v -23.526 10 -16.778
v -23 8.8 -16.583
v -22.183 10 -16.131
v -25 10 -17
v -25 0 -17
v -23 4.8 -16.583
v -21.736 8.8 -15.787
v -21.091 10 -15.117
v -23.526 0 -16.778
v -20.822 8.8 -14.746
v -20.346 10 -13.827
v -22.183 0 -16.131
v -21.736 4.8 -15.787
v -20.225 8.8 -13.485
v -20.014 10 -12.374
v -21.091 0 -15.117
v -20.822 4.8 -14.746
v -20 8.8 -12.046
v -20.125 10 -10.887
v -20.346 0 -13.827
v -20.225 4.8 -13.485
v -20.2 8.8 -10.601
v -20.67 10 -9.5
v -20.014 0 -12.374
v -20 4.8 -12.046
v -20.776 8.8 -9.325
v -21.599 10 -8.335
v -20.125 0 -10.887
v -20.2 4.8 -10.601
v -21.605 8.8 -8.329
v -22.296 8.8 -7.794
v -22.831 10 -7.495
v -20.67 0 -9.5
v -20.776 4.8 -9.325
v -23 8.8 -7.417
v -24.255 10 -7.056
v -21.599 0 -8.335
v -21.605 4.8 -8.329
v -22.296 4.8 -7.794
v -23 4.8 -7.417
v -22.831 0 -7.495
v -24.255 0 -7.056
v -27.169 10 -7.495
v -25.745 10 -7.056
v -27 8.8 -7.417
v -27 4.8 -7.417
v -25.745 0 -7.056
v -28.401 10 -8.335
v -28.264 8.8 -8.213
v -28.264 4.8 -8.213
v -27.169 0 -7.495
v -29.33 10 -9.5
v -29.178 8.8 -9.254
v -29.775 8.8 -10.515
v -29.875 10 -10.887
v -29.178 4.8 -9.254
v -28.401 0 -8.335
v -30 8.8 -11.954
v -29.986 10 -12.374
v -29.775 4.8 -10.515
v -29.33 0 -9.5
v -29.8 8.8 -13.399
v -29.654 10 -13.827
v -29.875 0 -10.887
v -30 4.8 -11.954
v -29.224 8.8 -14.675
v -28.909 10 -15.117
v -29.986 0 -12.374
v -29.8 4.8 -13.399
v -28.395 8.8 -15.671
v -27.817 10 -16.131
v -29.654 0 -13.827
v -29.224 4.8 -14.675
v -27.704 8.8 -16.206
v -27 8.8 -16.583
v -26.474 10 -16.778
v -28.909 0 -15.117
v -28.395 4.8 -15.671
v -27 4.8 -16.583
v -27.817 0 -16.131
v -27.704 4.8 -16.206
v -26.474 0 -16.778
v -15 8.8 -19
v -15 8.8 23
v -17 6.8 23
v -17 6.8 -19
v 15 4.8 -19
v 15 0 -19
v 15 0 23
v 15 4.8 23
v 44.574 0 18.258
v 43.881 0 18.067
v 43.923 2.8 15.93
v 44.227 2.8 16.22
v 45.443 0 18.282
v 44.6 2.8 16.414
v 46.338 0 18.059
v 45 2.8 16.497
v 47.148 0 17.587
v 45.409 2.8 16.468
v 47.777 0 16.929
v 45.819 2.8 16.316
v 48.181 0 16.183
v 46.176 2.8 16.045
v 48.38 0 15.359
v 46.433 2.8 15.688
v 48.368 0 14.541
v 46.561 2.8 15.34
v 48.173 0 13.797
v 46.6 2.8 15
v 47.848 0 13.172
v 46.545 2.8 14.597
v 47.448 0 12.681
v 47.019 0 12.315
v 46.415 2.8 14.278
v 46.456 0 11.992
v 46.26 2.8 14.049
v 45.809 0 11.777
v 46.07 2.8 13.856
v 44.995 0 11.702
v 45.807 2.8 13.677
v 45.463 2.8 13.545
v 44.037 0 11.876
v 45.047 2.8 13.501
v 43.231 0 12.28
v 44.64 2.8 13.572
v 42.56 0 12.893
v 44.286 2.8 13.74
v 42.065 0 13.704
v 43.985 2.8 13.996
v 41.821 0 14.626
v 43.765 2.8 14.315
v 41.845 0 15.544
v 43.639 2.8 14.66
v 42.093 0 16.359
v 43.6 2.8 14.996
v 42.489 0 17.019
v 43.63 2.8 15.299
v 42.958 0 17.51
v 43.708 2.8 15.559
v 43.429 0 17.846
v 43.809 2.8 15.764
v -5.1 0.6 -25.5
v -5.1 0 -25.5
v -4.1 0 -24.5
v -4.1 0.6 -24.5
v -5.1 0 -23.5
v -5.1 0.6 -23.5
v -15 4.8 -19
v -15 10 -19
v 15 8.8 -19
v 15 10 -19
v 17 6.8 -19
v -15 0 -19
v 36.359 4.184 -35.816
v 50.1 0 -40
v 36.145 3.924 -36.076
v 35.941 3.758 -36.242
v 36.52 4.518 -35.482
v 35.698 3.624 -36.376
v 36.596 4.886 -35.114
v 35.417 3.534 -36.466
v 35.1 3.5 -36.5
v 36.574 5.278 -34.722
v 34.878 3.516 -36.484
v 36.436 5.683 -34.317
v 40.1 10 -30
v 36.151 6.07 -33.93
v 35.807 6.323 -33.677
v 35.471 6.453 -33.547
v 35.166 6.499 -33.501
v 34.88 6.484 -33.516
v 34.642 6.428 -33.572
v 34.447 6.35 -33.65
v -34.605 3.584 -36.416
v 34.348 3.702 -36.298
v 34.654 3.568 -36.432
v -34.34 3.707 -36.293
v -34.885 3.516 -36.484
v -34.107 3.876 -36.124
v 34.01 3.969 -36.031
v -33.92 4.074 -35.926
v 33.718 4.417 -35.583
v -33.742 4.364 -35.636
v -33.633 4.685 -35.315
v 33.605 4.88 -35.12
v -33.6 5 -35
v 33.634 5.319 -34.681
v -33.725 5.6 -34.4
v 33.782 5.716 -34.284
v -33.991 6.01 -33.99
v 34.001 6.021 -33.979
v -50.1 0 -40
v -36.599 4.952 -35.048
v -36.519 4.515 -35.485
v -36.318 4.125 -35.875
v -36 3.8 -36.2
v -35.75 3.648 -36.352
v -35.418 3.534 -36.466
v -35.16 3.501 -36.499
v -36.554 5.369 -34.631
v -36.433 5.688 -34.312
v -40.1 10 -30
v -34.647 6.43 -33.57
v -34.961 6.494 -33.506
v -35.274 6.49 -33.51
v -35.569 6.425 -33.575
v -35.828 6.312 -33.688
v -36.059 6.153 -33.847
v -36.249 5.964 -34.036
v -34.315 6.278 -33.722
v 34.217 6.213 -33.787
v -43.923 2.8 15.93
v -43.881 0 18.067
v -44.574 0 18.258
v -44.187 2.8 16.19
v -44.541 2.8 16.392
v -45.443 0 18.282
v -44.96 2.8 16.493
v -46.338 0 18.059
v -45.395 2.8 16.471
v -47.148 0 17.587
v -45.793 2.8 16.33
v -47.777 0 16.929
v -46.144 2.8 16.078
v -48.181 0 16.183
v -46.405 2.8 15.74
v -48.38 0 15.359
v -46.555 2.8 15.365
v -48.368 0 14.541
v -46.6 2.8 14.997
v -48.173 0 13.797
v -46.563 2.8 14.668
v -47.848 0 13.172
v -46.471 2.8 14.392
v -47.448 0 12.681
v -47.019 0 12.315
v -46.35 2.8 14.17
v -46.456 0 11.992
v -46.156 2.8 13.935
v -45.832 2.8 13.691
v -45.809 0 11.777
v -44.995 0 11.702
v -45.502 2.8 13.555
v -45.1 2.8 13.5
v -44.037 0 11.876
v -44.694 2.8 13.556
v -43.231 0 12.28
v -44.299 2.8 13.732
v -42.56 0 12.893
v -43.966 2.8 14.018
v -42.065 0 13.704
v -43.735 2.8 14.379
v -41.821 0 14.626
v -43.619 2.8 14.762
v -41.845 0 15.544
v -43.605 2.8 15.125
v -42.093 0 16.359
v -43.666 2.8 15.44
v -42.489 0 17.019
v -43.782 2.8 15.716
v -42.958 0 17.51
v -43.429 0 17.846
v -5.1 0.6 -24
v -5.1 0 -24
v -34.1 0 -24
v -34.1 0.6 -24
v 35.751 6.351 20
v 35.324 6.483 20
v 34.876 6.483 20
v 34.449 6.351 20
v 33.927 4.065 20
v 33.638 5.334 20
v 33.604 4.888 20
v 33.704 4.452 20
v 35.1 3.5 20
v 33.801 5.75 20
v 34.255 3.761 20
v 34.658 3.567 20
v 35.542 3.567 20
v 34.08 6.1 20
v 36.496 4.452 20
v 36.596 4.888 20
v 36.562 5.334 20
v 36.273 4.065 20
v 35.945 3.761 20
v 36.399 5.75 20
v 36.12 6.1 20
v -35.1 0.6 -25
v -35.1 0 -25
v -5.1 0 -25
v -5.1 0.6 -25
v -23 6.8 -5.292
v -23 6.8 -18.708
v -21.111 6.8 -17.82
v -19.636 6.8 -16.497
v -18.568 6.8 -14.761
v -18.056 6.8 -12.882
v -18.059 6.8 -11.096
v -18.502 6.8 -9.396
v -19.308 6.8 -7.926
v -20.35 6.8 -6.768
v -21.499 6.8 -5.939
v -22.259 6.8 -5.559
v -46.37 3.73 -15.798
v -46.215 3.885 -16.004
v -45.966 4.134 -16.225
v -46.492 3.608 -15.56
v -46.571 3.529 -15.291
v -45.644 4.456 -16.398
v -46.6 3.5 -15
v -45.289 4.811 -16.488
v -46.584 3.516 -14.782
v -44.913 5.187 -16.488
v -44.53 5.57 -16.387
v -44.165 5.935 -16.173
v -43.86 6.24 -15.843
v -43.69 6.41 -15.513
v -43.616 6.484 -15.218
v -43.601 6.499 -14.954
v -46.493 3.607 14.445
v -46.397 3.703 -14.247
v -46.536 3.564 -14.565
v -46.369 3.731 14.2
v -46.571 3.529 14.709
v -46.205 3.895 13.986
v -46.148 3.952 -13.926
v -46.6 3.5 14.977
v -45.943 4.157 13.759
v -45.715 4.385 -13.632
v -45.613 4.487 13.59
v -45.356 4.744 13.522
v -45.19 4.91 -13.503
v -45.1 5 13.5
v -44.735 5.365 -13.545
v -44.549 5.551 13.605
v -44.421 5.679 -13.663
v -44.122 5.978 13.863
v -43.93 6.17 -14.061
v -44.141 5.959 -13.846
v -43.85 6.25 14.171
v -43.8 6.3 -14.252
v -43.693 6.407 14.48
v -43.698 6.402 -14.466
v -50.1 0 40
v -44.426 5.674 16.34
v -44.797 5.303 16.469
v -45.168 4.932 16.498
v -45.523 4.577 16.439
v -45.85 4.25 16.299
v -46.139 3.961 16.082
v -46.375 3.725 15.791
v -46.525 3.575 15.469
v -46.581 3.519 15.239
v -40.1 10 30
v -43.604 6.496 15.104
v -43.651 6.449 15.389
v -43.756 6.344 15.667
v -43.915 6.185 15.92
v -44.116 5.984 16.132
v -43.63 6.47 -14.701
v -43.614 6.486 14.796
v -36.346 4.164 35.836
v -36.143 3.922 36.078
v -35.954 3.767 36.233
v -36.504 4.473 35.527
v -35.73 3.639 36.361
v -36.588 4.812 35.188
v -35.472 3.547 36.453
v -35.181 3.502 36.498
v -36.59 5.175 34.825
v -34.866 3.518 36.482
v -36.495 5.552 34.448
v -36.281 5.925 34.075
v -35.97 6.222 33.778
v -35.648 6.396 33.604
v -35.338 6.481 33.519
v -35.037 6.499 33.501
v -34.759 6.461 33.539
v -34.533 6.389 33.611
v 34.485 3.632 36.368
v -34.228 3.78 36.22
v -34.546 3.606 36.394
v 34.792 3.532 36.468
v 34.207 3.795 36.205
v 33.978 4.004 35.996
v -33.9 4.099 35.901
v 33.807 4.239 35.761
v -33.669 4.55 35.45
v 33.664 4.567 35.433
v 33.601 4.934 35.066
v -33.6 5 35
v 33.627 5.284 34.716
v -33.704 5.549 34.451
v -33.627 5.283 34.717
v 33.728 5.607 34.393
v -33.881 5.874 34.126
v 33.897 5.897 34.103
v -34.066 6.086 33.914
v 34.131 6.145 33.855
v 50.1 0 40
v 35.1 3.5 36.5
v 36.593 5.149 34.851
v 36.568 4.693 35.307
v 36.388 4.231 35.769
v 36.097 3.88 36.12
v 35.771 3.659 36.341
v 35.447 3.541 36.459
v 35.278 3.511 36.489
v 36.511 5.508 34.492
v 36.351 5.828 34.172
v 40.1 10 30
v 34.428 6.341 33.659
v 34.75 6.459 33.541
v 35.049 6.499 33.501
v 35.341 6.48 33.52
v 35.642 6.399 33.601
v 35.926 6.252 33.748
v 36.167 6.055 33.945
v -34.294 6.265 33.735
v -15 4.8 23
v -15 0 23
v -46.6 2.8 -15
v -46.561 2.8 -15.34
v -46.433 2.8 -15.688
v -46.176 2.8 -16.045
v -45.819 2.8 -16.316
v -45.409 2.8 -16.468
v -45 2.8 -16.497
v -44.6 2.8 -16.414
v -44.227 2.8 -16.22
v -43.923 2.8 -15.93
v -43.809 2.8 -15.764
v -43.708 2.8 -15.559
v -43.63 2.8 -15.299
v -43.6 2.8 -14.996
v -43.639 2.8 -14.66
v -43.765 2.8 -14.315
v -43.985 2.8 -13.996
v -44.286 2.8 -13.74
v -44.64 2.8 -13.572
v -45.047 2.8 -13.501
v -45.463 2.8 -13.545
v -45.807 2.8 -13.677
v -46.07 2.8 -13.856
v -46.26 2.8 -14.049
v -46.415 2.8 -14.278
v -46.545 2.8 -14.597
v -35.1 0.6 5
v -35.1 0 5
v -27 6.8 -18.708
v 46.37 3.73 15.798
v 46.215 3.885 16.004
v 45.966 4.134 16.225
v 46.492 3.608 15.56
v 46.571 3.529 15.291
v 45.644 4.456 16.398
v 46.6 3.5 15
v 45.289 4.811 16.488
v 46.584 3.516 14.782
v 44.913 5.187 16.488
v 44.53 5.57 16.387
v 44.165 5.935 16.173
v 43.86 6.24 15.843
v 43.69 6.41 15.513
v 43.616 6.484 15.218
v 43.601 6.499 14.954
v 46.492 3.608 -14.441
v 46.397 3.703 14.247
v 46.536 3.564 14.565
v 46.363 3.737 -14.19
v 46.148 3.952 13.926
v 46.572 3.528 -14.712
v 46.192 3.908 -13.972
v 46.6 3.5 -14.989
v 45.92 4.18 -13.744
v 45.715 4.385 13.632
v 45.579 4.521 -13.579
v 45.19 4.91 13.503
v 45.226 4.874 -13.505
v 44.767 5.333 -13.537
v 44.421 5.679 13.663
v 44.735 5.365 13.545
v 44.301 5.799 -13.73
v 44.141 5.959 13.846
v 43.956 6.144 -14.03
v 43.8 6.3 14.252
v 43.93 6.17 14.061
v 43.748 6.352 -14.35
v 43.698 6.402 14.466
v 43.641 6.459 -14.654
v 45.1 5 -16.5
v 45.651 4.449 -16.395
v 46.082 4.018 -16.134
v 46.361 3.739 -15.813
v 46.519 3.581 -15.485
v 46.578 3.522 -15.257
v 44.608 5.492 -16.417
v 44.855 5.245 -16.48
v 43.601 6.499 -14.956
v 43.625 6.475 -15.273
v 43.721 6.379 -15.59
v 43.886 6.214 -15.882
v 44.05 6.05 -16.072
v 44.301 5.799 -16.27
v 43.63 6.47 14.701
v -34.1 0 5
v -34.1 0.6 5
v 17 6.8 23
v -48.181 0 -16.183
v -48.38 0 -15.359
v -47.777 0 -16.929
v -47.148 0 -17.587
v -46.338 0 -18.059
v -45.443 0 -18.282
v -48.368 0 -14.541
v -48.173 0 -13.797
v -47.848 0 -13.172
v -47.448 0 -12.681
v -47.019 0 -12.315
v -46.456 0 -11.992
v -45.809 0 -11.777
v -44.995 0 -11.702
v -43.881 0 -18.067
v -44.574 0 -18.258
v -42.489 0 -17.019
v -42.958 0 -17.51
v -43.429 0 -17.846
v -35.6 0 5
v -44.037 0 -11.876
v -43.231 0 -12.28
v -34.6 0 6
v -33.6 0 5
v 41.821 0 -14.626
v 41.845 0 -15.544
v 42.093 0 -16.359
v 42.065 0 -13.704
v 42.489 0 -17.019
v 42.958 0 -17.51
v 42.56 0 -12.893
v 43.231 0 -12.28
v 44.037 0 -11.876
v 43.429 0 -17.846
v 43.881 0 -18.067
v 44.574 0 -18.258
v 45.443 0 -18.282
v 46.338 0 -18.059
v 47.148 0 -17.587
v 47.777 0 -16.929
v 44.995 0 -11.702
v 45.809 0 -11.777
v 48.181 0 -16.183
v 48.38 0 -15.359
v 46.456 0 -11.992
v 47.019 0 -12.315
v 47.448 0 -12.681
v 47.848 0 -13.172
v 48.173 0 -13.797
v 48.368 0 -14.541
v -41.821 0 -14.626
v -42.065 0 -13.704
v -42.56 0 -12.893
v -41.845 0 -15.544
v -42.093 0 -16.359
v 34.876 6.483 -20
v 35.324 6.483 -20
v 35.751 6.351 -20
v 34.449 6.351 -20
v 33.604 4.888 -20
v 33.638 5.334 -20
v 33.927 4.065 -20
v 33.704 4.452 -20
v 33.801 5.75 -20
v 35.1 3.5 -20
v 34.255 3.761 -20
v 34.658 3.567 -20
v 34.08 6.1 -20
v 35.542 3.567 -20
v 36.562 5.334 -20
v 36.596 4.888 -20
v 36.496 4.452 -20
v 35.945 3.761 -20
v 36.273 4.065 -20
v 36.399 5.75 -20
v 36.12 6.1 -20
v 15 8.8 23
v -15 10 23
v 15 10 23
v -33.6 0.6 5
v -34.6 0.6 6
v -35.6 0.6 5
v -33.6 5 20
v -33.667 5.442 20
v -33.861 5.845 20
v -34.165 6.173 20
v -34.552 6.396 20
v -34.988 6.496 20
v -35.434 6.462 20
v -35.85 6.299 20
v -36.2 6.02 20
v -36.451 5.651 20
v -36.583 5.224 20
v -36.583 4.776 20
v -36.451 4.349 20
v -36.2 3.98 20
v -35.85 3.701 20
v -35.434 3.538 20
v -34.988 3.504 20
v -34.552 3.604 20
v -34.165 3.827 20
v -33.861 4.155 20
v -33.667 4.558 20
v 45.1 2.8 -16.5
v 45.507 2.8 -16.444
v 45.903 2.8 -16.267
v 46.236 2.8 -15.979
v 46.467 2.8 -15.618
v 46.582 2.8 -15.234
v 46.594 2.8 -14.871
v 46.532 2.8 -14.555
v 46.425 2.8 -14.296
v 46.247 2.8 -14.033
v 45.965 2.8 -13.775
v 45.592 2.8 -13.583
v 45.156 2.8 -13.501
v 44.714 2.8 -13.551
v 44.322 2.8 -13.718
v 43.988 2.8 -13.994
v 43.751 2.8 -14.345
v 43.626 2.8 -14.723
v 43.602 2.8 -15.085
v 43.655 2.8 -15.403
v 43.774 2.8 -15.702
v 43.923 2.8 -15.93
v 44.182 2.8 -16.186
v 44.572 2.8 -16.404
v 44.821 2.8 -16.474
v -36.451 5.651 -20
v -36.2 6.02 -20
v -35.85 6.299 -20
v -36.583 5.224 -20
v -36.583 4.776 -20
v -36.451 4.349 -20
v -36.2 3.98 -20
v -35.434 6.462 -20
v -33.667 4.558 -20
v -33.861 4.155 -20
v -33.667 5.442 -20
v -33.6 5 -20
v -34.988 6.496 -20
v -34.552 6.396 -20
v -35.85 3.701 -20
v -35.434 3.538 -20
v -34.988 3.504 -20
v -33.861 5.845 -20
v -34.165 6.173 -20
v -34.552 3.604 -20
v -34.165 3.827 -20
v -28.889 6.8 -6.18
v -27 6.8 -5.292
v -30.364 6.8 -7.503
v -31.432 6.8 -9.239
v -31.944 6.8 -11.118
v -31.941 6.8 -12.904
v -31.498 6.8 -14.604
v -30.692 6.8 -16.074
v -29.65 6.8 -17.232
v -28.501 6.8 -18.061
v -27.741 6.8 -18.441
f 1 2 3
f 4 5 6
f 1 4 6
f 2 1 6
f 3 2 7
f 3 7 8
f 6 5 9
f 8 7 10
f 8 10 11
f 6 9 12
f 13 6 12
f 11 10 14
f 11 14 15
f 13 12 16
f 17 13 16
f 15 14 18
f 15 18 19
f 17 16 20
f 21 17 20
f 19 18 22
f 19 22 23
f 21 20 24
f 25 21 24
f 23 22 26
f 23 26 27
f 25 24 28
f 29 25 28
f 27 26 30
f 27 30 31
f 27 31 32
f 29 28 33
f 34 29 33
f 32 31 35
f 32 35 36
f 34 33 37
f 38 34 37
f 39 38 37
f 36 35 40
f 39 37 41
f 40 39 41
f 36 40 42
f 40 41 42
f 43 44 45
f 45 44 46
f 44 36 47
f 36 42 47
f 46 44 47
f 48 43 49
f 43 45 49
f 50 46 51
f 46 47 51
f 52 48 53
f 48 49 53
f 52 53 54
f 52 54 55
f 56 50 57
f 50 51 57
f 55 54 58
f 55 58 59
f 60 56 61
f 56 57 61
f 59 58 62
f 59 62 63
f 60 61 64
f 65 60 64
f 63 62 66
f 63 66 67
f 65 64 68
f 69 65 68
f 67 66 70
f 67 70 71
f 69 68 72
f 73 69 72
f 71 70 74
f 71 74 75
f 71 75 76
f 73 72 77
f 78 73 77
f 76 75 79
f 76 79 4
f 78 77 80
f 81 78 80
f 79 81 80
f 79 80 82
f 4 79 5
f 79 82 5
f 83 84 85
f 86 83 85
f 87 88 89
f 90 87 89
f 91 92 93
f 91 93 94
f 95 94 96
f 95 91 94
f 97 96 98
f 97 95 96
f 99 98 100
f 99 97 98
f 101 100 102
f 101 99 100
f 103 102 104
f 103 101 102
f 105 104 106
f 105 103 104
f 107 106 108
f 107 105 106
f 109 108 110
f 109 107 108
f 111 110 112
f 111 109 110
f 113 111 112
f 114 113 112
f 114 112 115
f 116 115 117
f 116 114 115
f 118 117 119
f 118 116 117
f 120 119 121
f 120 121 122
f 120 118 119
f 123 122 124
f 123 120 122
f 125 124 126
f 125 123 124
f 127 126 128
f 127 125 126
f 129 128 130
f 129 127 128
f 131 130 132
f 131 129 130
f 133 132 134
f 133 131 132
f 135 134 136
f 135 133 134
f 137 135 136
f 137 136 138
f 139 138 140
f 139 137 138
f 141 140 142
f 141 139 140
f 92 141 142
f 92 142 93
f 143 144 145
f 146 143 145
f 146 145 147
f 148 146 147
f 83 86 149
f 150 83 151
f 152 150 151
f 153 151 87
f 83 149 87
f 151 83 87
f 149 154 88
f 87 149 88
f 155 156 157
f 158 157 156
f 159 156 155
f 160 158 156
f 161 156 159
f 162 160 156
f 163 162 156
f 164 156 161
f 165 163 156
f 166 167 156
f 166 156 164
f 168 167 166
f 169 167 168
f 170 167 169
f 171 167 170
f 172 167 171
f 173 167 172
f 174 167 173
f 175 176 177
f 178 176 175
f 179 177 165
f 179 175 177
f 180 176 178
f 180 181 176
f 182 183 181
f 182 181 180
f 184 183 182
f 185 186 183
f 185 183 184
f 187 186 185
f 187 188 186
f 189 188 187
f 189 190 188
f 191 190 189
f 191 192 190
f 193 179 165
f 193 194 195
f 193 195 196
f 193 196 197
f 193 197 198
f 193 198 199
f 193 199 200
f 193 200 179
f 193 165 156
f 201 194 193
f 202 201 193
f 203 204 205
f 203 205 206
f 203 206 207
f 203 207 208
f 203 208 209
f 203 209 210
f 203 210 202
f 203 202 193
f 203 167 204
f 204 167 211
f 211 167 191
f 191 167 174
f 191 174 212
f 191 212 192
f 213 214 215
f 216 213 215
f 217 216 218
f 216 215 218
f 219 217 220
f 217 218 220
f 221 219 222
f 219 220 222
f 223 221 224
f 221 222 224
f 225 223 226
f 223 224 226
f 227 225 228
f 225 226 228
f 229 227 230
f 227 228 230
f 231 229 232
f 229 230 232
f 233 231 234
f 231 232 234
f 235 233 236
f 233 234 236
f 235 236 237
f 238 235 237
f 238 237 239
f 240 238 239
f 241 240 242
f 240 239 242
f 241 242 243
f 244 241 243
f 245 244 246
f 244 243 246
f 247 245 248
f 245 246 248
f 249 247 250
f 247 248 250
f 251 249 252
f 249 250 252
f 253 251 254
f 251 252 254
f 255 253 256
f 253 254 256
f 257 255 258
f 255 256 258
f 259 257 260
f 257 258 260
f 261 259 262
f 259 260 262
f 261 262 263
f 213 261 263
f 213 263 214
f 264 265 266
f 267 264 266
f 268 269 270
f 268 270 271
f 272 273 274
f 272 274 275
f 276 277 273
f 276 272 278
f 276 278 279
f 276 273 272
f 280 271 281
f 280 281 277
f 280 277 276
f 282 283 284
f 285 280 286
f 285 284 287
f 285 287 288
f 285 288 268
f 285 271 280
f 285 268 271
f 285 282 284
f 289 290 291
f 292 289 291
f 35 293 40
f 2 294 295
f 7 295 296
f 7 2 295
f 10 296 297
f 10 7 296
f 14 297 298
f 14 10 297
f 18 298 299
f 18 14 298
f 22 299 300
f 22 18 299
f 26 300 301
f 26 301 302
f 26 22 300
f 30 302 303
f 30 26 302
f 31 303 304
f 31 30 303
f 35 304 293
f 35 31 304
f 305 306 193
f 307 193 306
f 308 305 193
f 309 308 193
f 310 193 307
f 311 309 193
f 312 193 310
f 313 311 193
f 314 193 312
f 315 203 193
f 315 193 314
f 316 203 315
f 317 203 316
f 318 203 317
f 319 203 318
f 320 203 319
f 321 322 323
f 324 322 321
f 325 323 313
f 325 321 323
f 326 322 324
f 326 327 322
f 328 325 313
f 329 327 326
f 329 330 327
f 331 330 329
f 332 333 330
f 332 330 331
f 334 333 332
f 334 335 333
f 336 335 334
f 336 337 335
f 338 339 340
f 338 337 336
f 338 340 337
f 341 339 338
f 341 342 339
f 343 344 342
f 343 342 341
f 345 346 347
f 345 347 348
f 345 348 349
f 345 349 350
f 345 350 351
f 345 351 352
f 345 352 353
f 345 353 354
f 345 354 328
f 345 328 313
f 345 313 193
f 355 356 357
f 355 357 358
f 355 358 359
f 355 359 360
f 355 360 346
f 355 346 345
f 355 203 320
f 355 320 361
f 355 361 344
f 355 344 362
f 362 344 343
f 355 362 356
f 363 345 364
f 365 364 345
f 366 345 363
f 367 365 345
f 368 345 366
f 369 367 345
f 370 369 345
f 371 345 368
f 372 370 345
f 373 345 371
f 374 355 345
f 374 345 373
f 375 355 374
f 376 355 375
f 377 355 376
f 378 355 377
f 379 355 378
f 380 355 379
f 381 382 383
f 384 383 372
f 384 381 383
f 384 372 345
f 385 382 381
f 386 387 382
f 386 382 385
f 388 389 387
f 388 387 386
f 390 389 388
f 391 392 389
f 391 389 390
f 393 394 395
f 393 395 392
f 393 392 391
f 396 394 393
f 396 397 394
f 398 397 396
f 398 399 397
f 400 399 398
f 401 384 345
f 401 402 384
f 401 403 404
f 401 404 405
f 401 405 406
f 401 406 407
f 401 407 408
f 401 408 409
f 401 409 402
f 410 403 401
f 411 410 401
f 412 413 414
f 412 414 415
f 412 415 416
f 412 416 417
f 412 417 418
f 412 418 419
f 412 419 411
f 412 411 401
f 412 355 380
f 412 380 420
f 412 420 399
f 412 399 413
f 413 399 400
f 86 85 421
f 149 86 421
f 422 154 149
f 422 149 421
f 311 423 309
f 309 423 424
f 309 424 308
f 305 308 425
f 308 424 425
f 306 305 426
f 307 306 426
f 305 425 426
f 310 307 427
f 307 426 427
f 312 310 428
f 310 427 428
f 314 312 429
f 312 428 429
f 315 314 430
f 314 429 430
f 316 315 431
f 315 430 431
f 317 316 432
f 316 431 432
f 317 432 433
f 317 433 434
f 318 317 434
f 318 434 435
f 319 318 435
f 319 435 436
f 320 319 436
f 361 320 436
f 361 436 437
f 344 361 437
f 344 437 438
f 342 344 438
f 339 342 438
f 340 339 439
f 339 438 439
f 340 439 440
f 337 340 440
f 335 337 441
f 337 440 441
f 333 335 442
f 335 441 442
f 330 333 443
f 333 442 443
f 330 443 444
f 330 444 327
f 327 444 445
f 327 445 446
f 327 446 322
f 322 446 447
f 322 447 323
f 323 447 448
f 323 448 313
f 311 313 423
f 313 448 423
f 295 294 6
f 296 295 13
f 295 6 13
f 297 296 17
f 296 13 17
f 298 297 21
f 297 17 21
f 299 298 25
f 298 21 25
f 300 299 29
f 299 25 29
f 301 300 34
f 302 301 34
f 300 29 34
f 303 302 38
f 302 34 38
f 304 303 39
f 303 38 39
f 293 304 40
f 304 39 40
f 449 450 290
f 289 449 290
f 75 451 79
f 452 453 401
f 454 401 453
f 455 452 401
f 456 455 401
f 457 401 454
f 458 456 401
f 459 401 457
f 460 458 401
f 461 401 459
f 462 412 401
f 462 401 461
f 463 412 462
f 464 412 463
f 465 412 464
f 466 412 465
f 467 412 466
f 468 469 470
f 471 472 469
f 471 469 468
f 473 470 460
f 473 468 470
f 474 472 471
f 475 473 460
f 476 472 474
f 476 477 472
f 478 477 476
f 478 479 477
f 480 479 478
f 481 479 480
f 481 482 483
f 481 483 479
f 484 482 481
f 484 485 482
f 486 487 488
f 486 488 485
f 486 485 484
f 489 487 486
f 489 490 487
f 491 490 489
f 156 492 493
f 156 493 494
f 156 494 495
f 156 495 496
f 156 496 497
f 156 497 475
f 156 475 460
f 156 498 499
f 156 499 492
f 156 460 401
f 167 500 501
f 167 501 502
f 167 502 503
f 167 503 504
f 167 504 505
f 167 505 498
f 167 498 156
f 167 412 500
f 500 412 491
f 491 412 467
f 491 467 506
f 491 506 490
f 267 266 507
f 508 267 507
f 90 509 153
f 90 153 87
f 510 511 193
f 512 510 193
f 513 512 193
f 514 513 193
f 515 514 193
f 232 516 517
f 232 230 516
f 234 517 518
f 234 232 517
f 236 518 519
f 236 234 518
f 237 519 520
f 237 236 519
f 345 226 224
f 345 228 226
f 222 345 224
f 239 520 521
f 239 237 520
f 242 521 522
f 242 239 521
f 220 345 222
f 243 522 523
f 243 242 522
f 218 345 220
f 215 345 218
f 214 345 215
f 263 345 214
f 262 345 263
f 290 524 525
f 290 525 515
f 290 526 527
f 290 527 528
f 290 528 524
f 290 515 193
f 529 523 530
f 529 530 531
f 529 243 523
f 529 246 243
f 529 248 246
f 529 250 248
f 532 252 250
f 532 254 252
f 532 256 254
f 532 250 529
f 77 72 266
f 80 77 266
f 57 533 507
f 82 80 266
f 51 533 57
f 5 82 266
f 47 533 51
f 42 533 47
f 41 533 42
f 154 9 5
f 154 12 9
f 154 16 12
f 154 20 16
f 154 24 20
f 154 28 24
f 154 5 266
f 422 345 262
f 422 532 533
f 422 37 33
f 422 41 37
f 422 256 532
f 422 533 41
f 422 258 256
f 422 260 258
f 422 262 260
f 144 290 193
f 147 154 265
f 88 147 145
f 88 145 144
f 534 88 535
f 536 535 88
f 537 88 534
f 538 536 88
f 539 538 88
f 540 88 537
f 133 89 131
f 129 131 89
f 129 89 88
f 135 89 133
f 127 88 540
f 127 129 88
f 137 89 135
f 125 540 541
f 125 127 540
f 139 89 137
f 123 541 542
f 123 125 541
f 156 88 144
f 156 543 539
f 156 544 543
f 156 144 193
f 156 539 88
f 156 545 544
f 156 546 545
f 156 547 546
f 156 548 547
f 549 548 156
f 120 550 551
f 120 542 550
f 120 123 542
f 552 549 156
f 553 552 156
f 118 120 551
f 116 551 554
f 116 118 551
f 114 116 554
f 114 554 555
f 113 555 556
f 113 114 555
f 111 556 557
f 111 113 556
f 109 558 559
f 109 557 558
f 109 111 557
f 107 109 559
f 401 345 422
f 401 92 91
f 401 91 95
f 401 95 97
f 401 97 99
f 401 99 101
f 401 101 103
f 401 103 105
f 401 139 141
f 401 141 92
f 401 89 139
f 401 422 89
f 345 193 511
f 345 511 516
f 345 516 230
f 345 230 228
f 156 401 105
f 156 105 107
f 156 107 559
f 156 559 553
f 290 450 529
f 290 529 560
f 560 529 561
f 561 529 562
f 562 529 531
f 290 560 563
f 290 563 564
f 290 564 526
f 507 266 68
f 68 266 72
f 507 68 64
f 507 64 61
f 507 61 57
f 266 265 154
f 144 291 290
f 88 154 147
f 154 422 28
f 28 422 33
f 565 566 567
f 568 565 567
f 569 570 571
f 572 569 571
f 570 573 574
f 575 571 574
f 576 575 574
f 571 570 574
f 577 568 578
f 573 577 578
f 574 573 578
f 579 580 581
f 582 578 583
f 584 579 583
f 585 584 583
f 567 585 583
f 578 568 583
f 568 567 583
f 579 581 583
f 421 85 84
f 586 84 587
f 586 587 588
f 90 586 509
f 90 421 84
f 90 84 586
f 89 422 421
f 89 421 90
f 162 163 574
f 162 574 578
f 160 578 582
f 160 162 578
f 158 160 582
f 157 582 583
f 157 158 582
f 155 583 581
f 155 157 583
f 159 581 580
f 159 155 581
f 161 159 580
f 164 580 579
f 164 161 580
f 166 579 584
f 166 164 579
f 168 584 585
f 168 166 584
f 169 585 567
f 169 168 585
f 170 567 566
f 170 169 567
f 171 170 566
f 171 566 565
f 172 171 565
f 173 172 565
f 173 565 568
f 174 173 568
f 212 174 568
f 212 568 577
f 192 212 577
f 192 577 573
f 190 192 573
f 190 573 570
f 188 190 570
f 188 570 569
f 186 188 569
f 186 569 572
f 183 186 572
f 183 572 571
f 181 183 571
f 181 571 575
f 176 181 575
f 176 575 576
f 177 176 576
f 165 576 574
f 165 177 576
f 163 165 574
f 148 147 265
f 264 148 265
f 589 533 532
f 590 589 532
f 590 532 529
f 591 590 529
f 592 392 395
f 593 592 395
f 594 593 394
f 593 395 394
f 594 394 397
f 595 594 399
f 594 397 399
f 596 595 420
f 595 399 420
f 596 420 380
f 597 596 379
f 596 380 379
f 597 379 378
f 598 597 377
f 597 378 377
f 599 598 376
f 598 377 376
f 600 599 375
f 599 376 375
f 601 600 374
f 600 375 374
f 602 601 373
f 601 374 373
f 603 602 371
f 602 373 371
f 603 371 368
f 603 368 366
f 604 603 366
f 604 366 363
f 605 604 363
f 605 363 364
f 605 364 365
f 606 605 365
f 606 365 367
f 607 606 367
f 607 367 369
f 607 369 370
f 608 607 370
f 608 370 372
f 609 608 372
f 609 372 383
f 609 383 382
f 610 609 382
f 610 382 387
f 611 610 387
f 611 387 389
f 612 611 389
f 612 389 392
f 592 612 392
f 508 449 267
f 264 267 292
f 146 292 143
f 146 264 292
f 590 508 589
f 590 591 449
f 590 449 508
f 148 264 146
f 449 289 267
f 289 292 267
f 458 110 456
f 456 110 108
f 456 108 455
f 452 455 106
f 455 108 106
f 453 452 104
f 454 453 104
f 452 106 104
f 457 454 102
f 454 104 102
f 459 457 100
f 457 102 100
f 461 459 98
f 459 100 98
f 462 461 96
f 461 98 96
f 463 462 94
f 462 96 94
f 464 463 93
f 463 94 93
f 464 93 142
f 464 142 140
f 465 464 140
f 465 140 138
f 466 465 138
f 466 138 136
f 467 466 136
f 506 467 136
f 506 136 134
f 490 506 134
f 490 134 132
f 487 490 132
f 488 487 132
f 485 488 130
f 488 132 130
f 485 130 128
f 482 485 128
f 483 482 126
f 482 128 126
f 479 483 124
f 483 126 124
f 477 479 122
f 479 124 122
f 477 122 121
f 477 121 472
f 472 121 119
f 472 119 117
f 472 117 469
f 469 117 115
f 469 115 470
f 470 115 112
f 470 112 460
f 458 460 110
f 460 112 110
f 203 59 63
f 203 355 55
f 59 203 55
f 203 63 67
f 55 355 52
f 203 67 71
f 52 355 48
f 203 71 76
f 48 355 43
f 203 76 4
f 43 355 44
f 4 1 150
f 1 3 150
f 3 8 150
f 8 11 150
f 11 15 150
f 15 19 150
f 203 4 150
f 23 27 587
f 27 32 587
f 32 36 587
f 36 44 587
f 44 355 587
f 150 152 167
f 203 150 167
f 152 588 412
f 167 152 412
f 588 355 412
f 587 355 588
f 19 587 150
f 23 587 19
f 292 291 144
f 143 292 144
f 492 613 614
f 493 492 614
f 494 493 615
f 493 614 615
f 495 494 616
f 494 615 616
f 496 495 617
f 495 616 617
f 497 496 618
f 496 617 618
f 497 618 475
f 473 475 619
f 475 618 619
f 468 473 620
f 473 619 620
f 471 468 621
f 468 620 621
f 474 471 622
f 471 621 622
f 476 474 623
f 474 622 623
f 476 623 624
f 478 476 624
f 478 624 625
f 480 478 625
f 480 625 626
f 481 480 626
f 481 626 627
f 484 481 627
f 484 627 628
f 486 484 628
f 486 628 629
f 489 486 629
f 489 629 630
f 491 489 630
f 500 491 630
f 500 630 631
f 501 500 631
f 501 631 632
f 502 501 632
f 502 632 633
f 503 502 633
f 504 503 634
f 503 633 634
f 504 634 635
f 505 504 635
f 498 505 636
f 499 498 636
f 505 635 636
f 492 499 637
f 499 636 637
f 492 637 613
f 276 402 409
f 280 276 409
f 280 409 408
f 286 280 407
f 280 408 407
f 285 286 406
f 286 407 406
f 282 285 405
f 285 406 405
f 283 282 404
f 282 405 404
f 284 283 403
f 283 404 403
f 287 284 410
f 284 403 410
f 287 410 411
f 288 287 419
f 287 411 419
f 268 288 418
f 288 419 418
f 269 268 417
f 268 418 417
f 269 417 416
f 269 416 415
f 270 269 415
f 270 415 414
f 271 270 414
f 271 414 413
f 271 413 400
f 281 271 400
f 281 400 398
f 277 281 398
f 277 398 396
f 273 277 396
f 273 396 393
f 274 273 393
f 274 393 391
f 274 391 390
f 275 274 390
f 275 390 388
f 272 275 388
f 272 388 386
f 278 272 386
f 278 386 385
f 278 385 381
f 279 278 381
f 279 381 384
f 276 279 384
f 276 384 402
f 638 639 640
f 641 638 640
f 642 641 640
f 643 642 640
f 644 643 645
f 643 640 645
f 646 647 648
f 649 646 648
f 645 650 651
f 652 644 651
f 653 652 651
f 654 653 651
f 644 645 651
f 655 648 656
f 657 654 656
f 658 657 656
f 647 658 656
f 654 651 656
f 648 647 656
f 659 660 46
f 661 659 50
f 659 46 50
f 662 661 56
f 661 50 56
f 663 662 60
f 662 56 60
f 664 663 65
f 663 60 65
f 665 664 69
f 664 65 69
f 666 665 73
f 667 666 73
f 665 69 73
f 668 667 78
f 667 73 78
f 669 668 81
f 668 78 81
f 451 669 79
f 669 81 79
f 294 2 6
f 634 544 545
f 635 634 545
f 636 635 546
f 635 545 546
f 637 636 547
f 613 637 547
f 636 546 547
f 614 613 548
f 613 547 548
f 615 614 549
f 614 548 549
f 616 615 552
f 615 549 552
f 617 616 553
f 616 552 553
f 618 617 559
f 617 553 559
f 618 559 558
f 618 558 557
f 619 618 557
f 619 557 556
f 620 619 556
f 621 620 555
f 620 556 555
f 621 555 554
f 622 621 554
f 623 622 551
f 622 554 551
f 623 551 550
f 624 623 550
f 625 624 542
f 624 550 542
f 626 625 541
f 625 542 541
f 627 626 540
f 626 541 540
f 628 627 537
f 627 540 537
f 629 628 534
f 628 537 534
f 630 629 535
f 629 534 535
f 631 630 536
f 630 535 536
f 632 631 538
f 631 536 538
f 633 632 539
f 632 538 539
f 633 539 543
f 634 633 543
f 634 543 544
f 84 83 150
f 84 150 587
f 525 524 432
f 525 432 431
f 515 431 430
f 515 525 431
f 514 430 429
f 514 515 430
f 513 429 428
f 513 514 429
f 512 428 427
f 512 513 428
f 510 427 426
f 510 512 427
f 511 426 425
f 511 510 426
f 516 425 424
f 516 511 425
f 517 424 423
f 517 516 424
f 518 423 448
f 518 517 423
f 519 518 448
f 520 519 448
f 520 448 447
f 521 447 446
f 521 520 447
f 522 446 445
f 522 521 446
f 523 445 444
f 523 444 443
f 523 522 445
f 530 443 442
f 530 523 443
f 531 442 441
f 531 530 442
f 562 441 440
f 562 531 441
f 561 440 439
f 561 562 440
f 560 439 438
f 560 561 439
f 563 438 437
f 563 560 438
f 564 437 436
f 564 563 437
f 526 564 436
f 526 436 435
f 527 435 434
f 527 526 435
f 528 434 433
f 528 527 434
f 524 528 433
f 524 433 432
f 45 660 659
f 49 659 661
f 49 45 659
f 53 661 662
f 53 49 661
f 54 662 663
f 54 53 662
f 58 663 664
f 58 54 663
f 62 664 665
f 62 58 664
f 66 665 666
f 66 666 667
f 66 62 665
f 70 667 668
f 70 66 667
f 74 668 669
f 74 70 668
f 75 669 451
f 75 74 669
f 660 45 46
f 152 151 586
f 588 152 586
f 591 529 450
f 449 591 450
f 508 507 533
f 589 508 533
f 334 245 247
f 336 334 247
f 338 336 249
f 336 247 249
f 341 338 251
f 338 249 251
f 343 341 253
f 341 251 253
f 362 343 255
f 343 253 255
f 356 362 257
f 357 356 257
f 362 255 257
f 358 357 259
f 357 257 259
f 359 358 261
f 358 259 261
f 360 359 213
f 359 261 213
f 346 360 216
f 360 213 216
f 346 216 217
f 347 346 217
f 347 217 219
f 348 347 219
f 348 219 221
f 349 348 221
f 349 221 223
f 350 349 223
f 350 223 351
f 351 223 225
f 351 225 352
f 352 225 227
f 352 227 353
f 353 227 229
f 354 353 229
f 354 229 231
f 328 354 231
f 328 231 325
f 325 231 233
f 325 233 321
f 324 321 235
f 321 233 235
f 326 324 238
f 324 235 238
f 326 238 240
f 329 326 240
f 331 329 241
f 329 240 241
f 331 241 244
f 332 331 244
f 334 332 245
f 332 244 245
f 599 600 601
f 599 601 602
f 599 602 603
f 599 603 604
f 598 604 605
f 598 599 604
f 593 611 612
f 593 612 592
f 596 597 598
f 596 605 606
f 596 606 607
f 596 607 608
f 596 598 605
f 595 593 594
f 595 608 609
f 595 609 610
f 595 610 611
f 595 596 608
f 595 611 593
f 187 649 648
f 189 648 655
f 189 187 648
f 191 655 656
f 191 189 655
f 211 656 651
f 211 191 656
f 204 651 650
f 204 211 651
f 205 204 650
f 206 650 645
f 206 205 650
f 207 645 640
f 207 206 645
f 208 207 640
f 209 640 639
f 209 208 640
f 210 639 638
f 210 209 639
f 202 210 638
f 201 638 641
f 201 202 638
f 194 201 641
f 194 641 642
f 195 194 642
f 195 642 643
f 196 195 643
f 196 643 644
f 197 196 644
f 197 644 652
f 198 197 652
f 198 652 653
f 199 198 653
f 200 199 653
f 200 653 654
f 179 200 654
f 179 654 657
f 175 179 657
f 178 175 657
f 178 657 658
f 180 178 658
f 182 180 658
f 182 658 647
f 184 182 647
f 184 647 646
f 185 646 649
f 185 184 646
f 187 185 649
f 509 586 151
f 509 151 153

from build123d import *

# Parameters (mm, degrees)
SKETCH_4_R          = 1.5
CUT_EXTRUDE_1_DEPTH = 20
SKETCH_5_R          = 1.5
CUT_EXTRUDE_2_DEPTH = 65.884590004
SKETCH3_R           = 5
SKETCH3_W           = 30
SKETCH3_H           = 42
CUT_EXTRUDE1_DEPTH  = 65.884590004
CUT_EXTRUDE2_DEPTH  = 42
CUT_EXTRUDE_3_DEPTH = 0.6


with BuildPart() as part:
    # Эскиз1 → Loft 1 section 0
    with BuildSketch(Plane(origin=(0, 0, 0), x_dir=(1, 0, 0), z_dir=(0, 1, 0))):
        with BuildLine():
            Line((-50.1, -40), (50.1, -40))
            Line((50.1, -40), (50.1, 40))
            Line((50.1, 40), (-50.1, 40))
            Line((-50.1, 40), (-50.1, -40))
        make_face()
    # Эскиз2 → Loft 1 section 1
    with BuildSketch(Plane(origin=(0, 10, 0), x_dir=(1, 0, 0), z_dir=(0, 1, 0))):
        with BuildLine():
            Line((40.1, -30), (40.1, 30))
            Line((40.1, 30), (-40.1, 30))
            Line((-40.1, 30), (-40.1, -30))
            Line((-40.1, -30), (40.1, -30))
        make_face()
    loft()

    # Эскиз4 → Вырез-Вытянуть1 (cut)
    with BuildSketch(Plane.XY.offset(40)):
        with Locations((-35.1, 5)):
            Circle(SKETCH_4_R)
        with Locations(Location((35.1, 5, 0), (0, 0, 270))):
            Circle(SKETCH_4_R)
    cut_extrude_1 = extrude(amount=-CUT_EXTRUDE_1_DEPTH, mode=Mode.SUBTRACT)

    # Зеркальное отражение1: Вырез-Вытянуть1 across plane
    add(cut_extrude_1.mirror(Plane.XY), mode=Mode.SUBTRACT)

    # Эскиз5 → Вырез-Вытянуть2 (cut, through all)
    with BuildSketch(Plane.XZ):
        with Locations(Location((-45.1, 15, 0), (0, 0, 270))):
            Circle(SKETCH_5_R)
        with Locations(Location((-45.1, -15, 0), (0, 0, 180))):
            Circle(SKETCH_5_R)
        with Locations(Location((45.1, -15, 0), (0, 0, 270))):
            Circle(SKETCH_5_R)
        with Locations((45.1, 15)):
            Circle(SKETCH_5_R)
    extrude(amount=-CUT_EXTRUDE_2_DEPTH, mode=Mode.SUBTRACT)

    # Cut-Loft1: read off the stored shape, not the designer's step
    # Cut-Loft1: loft between two sections, ruled curve by curve
    cut_loft1_from = [
        Edge.make_bspline([(-43.923484762, 2.8, 15.930490137), (-45.784465036, 2.8, 18.283520613), (-48.137495512, 2.8, 16.422540339), (-46.276515238, 2.8, 14.069509863), (-44.415534964, 2.8, 11.716479387), (-42.062504488, 2.8, 13.577459661), (-43.923484762, 2.8, 15.930490137)], [0, 0, 0, 0, 0.5, 0.5, 0.5, 1, 1, 1, 1], 3, [1, 0.333333333, 0.333333333, 1, 0.333333333, 0.333333333, 1]),
    ]
    cut_loft1_to = [
        Edge.make_bspline([(-43.881334244, 0, 18.066733405), (-50.014801053, 0, 20.504064917), (-52.452132565, 0, 14.370598107), (-46.318665756, 0, 11.933266595), (-40.185198947, 0, 9.495935083), (-37.747867435, 0, 15.629401893), (-43.881334244, 0, 18.066733405)], [0, 0, 0, 0, 0.5, 0.5, 0.5, 1, 1, 1, 1], 3, [1, 0.333333333, 0.333333333, 1, 0.333333333, 0.333333333, 1]),
    ]
    cut_loft1 = Solid(Shell([*[Face.make_surface_from_curves(cut_loft1_from[k], cut_loft1_to[k]) for k in range(1)], Face(Wire(cut_loft1_from)), Face(Wire(cut_loft1_to))]))
    add(cut_loft1, mode=Mode.SUBTRACT)

    # Mirror1: Cut-Loft1 across plane
    add(cut_loft1.mirror(Plane.XY), mode=Mode.SUBTRACT)

    # Mirror2: read off the stored shape, not the designer's step
    # Mirror2: loft between two sections, ruled curve by curve
    mirror2_from = [
        Edge.make_bspline([(43.923484762, 2.8, 15.930490137), (45.784465036, 2.8, 18.283520613), (48.137495512, 2.8, 16.422540339), (46.276515238, 2.8, 14.069509863), (44.415534964, 2.8, 11.716479387), (42.062504488, 2.8, 13.577459661), (43.923484762, 2.8, 15.930490137)], [0, 0, 0, 0, 0.5, 0.5, 0.5, 1, 1, 1, 1], 3, [1, 0.333333333, 0.333333333, 1, 0.333333333, 0.333333333, 1]),
    ]
    mirror2_to = [
        Edge.make_bspline([(43.881334244, 0, 18.066733405), (50.014801053, 0, 20.504064917), (52.452132565, 0, 14.370598107), (46.318665756, 0, 11.933266595), (40.185198947, 0, 9.495935083), (37.747867435, 0, 15.629401893), (43.881334244, 0, 18.066733405)], [0, 0, 0, 0, 0.5, 0.5, 0.5, 1, 1, 1, 1], 3, [1, 0.333333333, 0.333333333, 1, 0.333333333, 0.333333333, 1]),
    ]
    mirror2 = Solid(Shell([*[Face.make_surface_from_curves(mirror2_from[k], mirror2_to[k]) for k in range(1)], Face(Wire(mirror2_from)), Face(Wire(mirror2_to))]))
    add(mirror2, mode=Mode.SUBTRACT)

    # Mirror2 2: loft between two sections, ruled curve by curve
    mirror2_2_from = [
        Edge.make_bspline([(43.923484762, 2.8, -15.930490137), (45.784465036, 2.8, -18.283520613), (48.137495512, 2.8, -16.422540339), (46.276515238, 2.8, -14.069509863), (44.415534964, 2.8, -11.716479387), (42.062504488, 2.8, -13.577459661), (43.923484762, 2.8, -15.930490137)], [0, 0, 0, 0, 0.5, 0.5, 0.5, 1, 1, 1, 1], 3, [1, 0.333333333, 0.333333333, 1, 0.333333333, 0.333333333, 1]),
    ]
    mirror2_2_to = [
        Edge.make_bspline([(43.881334244, 0, -18.066733405), (50.014801053, 0, -20.504064917), (52.452132565, 0, -14.370598107), (46.318665756, 0, -11.933266595), (40.185198947, 0, -9.495935083), (37.747867435, 0, -15.629401893), (43.881334244, 0, -18.066733405)], [0, 0, 0, 0, 0.5, 0.5, 0.5, 1, 1, 1, 1], 3, [1, 0.333333333, 0.333333333, 1, 0.333333333, 0.333333333, 1]),
    ]
    mirror2_2 = Solid(Shell([*[Face.make_surface_from_curves(mirror2_2_from[k], mirror2_2_to[k]) for k in range(1)], Face(Wire(mirror2_2_from)), Face(Wire(mirror2_2_to))]))
    add(mirror2_2, mode=Mode.SUBTRACT)

    # Sketch3 → Cut-Extrude1 (cut, through all)
    with BuildSketch(Plane.XZ):
        with Locations(Location((-25, -12, 0), (0, 0, 270))):
            Circle(SKETCH3_R)
        with Locations((0, 2)):
            Rectangle(SKETCH3_W, SKETCH3_H)
    extrude(amount=-CUT_EXTRUDE1_DEPTH, mode=Mode.SUBTRACT)

    # Sketch4 → Cut-Extrude2 (cut)
    with BuildSketch(Plane.XY.offset(-19)):
        Polygon((-15, 8.8), (-17, 6.8), (-15, 4.8), align=None)
        Polygon((15, 4.8), (15, 8.8), (17, 6.8), align=None)
    extrude(amount=CUT_EXTRUDE2_DEPTH, mode=Mode.SUBTRACT)

    # Loft 1 2: read off the stored shape, not the designer's step
    # Loft 1 2: loft between two sections, ruled curve by curve
    loft_1_2_from = [
        Edge.make_bspline([(-23, 6.8, -18.708203932), (-14.818181818, 6.8, -16.268857048), (-14.818181818, 6.8, -7.731142952), (-23, 6.8, -5.291796068)], [0, 0, 0, 0, 1, 1, 1, 1], 3, [1, 0.523809524, 0.523809524, 1]),
        Edge.make_line((-23, 6.8, -5.291796068), (-23, 6.8, -18.708203932)),
    ]
    loft_1_2_to = [
        Edge.make_bspline([(-23, 4.8, -16.582575695), (-18.333333333, 4.8, -14.545875386), (-18.333333333, 4.8, -9.454124614), (-23, 4.8, -7.417424305)], [0, 0, 0, 0, 1, 1, 1, 1], 3, [1, 0.6, 0.6, 1]),
        Edge.make_line((-23, 4.8, -7.417424305), (-23, 4.8, -16.582575695)),
    ]
    loft_1_2 = Solid(Shell([*[Face.make_surface_from_curves(loft_1_2_from[k], loft_1_2_to[k]) for k in range(2)], Face(Wire(loft_1_2_from)), Face(Wire(loft_1_2_to))]))
    add(loft_1_2, mode=Mode.SUBTRACT)

    # Вырез-По сечениям2: read off the stored shape, not the designer's step
    # Вырез-По сечениям2: loft between two sections, ruled curve by curve
    loft_2_from = [
        Edge.make_bspline([(-27, 6.8, -5.291796068), (-35.181818182, 6.8, -7.731142952), (-35.181818182, 6.8, -16.268857048), (-27, 6.8, -18.708203932)], [0, 0, 0, 0, 1, 1, 1, 1], 3, [1, 0.523809524, 0.523809524, 1]),
        Edge.make_line((-27, 6.8, -18.708203932), (-27, 6.8, -5.291796068)),
    ]
    loft_2_to = [
        Edge.make_bspline([(-27, 4.8, -7.417424305), (-31.666666667, 4.8, -9.454124614), (-31.666666667, 4.8, -14.545875386), (-27, 4.8, -16.582575695)], [0, 0, 0, 0, 1, 1, 1, 1], 3, [1, 0.6, 0.6, 1]),
        Edge.make_line((-27, 4.8, -16.582575695), (-27, 4.8, -7.417424305)),
    ]
    loft_2 = Solid(Shell([*[Face.make_surface_from_curves(loft_2_from[k], loft_2_to[k]) for k in range(2)], Face(Wire(loft_2_from)), Face(Wire(loft_2_to))]))
    add(loft_2, mode=Mode.SUBTRACT)

    # Зеркальное отражение2: Loft 1 2, Вырез-По сечениям2 across plane
    add(loft_1_2.mirror(Plane(origin=(0, 6.8, 0), x_dir=(0, 0, 1), z_dir=(0, -1, 0))), mode=Mode.SUBTRACT)
    add(loft_2.mirror(Plane(origin=(0, 6.8, 0), x_dir=(0, 0, 1), z_dir=(0, -1, 0))), mode=Mode.SUBTRACT)

    # Эскиз8 → Вырез-Вытянуть3 (cut)
    with BuildSketch(Plane.XZ):
        Polygon((-35.1, 5), (-35.1, -25), (-5.1, -25), (-5.1, -25.5), (-4.1, -24.5), (-5.1, -23.5), (-5.1, -24), (-34.1, -24), (-34.1, 5), (-33.6, 5), (-34.6, 6), (-35.6, 5), align=None)
    extrude(amount=-CUT_EXTRUDE_3_DEPTH, mode=Mode.SUBTRACT)


solid = part.part
